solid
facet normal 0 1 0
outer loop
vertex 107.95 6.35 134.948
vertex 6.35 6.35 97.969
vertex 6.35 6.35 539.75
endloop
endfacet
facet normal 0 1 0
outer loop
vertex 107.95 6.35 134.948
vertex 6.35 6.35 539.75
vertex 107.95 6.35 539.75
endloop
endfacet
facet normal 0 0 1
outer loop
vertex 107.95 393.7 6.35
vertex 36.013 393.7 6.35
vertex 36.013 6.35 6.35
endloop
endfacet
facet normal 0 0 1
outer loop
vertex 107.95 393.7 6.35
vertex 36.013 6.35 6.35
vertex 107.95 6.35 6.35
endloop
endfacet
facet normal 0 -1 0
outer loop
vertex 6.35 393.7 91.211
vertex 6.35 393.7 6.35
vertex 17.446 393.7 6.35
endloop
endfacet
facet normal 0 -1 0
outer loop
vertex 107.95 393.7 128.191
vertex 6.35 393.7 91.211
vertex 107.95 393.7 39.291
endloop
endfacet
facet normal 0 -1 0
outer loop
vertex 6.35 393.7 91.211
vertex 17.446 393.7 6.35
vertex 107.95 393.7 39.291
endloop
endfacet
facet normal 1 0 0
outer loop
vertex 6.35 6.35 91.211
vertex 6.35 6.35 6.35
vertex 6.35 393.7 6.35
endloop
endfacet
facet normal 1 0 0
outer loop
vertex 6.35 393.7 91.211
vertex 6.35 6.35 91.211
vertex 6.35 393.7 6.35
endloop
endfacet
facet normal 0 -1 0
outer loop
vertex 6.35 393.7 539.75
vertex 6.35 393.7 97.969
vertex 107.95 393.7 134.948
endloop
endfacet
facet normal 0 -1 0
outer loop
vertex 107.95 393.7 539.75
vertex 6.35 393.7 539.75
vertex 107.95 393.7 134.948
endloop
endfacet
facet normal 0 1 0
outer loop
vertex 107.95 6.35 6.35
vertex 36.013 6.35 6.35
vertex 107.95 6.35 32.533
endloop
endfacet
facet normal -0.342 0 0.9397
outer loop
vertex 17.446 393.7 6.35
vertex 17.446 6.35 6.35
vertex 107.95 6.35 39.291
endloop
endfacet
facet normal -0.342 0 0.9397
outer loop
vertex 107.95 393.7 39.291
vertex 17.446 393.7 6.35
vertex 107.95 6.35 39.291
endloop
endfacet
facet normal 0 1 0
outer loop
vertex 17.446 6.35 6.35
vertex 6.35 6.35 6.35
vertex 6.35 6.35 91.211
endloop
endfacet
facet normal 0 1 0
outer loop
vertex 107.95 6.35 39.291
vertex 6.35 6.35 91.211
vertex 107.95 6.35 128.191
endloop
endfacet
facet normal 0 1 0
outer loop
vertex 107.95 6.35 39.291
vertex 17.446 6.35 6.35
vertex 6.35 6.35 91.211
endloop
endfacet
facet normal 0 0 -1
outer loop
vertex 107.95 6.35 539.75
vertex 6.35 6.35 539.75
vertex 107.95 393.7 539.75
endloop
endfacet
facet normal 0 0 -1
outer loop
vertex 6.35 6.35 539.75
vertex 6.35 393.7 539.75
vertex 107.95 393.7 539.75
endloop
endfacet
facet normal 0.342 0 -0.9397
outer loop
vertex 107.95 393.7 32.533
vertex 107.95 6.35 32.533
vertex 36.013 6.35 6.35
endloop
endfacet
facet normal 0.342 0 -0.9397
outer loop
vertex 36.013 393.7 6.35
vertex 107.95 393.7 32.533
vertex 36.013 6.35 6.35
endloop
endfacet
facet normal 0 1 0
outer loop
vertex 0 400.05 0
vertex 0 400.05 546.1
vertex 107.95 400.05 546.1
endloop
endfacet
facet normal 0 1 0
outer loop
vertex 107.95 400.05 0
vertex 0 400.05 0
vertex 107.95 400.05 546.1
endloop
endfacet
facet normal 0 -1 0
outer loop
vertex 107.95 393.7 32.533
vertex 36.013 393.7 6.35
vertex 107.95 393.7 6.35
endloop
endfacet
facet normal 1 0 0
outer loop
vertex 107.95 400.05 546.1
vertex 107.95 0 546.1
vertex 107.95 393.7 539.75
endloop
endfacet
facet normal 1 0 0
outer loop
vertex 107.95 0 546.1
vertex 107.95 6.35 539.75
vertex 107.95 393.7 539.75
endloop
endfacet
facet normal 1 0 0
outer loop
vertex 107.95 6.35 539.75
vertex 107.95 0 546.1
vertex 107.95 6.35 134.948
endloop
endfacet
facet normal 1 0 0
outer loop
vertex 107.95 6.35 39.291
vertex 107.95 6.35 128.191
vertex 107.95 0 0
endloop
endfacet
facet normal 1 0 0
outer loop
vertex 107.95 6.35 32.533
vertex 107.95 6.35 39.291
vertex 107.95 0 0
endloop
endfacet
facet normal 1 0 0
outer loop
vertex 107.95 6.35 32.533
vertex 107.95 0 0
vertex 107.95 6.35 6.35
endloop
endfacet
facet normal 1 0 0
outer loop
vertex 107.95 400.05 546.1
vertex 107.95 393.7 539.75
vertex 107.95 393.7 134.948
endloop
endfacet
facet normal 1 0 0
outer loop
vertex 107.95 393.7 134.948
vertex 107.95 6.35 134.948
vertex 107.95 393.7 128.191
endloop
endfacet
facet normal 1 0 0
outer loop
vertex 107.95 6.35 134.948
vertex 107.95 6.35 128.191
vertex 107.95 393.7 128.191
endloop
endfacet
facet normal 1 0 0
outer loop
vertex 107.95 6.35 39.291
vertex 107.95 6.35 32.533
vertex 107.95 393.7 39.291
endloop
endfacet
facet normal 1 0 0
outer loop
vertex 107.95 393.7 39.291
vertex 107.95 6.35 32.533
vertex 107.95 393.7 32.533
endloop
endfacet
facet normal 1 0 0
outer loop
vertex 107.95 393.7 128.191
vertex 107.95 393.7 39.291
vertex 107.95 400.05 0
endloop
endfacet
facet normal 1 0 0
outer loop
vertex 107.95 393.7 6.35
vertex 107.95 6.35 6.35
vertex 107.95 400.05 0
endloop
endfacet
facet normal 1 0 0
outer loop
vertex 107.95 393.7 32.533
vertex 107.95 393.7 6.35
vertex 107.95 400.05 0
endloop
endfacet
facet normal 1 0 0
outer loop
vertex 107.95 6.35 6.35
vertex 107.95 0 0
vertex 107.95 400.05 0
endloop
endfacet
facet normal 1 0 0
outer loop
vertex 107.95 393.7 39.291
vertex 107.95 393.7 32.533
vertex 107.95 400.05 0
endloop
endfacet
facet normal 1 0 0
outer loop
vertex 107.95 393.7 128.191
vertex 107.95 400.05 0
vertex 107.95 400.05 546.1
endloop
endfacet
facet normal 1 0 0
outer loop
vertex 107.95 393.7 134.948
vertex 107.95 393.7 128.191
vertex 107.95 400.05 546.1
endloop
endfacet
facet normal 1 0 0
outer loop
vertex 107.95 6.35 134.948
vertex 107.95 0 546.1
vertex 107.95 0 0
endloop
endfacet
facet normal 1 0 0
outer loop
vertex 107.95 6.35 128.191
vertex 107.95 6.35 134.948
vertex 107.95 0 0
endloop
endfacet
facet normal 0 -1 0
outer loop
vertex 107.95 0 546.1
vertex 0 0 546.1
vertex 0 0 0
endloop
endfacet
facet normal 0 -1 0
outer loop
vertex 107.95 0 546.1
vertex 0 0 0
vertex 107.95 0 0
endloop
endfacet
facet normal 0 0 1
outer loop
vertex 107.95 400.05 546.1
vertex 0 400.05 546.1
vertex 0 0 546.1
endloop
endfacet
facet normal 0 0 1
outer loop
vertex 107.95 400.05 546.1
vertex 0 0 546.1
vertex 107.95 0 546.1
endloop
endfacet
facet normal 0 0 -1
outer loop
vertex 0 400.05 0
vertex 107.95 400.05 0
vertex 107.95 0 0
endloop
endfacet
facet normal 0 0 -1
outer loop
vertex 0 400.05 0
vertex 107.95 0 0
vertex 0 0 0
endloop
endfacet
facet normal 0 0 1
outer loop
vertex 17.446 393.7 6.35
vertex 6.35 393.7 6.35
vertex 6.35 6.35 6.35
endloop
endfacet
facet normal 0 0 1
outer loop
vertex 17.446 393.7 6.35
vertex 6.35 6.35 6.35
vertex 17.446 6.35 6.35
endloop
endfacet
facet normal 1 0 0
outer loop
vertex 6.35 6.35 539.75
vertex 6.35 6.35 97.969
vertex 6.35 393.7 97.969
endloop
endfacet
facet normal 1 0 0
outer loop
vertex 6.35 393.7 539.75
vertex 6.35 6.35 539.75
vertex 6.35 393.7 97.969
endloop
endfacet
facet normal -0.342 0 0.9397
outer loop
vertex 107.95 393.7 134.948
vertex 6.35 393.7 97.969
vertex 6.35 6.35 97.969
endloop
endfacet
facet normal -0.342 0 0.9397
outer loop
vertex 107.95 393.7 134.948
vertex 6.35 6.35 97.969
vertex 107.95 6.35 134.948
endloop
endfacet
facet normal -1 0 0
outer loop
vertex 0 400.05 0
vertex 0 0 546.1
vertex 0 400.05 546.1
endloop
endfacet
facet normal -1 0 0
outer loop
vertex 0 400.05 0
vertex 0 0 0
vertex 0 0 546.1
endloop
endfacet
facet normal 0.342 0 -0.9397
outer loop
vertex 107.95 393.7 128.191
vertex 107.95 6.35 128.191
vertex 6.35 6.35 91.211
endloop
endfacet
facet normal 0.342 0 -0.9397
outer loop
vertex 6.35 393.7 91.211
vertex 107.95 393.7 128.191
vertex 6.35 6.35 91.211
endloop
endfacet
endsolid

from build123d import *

# Parameters (mm, degrees)
F0_W      = 107.95
F0_H      = 400.05
F1_DEPTH  = 6.35
F2_W      = 107.95
F2_H      = 6.35
F3_DEPTH  = 533.4
F4_W      = 6.35
F4_H      = 387.35
F5_DEPTH  = 533.4
F6_W      = 107.95
F6_H      = 400.05
F7_DEPTH  = 6.35
F9_DEPTH  = 387.35
F11_DEPTH = 387.35


with BuildPart() as f1:
    # F0 (on Top) → F1 (new body)
    with BuildSketch(Plane.XY):
        with Locations((53.975, 200.025)):
            Rectangle(F0_W, F0_H)
    extrude(amount=F1_DEPTH)

    # F2 (on face) → F3 (join)
    with BuildSketch(Plane.XY.offset(6.35)):
        with Locations((53.975, 3.175)):
            Rectangle(F2_W, F2_H)
        with Locations((53.975, 396.875)):
            Rectangle(F2_W, F2_H)
    extrude(amount=F3_DEPTH)

    # F4 (on face) → F5 (join)
    with BuildSketch(Plane.XY.offset(6.35)):
        with Locations((3.175, 200.025)):
            Rectangle(F4_W, F4_H)
    extrude(amount=F5_DEPTH)

    # F6 (on face) → F7 (join)
    with BuildSketch(Plane.XY.offset(539.75)):
        with Locations((53.975, 200.025)):
            Rectangle(F6_W, F6_H)
    extrude(amount=F7_DEPTH)

    # F8 (on face) → F9 (join)
    with BuildSketch(Plane(origin=(0, 6.35, 0), x_dir=(-1, 0, 0), z_dir=(0, 1, 0))):
        Polygon((-18.566158, 0), (0, 0), (-107.95, 39.290587), (-107.95, 32.533058), align=None)
    extrude(amount=F9_DEPTH)

    # F10 (on face) → F11 (join)
    with BuildSketch(Plane(origin=(0, 6.35, 0), x_dir=(-1, 0, 0), z_dir=(0, 1, 0))):
        Polygon((-107.95, 134.948116), (-107.95, 128.190587), (-6.35, 91.211211), (-6.35, 97.96874), align=None)
    extrude(amount=F11_DEPTH)


solid = f1.part
